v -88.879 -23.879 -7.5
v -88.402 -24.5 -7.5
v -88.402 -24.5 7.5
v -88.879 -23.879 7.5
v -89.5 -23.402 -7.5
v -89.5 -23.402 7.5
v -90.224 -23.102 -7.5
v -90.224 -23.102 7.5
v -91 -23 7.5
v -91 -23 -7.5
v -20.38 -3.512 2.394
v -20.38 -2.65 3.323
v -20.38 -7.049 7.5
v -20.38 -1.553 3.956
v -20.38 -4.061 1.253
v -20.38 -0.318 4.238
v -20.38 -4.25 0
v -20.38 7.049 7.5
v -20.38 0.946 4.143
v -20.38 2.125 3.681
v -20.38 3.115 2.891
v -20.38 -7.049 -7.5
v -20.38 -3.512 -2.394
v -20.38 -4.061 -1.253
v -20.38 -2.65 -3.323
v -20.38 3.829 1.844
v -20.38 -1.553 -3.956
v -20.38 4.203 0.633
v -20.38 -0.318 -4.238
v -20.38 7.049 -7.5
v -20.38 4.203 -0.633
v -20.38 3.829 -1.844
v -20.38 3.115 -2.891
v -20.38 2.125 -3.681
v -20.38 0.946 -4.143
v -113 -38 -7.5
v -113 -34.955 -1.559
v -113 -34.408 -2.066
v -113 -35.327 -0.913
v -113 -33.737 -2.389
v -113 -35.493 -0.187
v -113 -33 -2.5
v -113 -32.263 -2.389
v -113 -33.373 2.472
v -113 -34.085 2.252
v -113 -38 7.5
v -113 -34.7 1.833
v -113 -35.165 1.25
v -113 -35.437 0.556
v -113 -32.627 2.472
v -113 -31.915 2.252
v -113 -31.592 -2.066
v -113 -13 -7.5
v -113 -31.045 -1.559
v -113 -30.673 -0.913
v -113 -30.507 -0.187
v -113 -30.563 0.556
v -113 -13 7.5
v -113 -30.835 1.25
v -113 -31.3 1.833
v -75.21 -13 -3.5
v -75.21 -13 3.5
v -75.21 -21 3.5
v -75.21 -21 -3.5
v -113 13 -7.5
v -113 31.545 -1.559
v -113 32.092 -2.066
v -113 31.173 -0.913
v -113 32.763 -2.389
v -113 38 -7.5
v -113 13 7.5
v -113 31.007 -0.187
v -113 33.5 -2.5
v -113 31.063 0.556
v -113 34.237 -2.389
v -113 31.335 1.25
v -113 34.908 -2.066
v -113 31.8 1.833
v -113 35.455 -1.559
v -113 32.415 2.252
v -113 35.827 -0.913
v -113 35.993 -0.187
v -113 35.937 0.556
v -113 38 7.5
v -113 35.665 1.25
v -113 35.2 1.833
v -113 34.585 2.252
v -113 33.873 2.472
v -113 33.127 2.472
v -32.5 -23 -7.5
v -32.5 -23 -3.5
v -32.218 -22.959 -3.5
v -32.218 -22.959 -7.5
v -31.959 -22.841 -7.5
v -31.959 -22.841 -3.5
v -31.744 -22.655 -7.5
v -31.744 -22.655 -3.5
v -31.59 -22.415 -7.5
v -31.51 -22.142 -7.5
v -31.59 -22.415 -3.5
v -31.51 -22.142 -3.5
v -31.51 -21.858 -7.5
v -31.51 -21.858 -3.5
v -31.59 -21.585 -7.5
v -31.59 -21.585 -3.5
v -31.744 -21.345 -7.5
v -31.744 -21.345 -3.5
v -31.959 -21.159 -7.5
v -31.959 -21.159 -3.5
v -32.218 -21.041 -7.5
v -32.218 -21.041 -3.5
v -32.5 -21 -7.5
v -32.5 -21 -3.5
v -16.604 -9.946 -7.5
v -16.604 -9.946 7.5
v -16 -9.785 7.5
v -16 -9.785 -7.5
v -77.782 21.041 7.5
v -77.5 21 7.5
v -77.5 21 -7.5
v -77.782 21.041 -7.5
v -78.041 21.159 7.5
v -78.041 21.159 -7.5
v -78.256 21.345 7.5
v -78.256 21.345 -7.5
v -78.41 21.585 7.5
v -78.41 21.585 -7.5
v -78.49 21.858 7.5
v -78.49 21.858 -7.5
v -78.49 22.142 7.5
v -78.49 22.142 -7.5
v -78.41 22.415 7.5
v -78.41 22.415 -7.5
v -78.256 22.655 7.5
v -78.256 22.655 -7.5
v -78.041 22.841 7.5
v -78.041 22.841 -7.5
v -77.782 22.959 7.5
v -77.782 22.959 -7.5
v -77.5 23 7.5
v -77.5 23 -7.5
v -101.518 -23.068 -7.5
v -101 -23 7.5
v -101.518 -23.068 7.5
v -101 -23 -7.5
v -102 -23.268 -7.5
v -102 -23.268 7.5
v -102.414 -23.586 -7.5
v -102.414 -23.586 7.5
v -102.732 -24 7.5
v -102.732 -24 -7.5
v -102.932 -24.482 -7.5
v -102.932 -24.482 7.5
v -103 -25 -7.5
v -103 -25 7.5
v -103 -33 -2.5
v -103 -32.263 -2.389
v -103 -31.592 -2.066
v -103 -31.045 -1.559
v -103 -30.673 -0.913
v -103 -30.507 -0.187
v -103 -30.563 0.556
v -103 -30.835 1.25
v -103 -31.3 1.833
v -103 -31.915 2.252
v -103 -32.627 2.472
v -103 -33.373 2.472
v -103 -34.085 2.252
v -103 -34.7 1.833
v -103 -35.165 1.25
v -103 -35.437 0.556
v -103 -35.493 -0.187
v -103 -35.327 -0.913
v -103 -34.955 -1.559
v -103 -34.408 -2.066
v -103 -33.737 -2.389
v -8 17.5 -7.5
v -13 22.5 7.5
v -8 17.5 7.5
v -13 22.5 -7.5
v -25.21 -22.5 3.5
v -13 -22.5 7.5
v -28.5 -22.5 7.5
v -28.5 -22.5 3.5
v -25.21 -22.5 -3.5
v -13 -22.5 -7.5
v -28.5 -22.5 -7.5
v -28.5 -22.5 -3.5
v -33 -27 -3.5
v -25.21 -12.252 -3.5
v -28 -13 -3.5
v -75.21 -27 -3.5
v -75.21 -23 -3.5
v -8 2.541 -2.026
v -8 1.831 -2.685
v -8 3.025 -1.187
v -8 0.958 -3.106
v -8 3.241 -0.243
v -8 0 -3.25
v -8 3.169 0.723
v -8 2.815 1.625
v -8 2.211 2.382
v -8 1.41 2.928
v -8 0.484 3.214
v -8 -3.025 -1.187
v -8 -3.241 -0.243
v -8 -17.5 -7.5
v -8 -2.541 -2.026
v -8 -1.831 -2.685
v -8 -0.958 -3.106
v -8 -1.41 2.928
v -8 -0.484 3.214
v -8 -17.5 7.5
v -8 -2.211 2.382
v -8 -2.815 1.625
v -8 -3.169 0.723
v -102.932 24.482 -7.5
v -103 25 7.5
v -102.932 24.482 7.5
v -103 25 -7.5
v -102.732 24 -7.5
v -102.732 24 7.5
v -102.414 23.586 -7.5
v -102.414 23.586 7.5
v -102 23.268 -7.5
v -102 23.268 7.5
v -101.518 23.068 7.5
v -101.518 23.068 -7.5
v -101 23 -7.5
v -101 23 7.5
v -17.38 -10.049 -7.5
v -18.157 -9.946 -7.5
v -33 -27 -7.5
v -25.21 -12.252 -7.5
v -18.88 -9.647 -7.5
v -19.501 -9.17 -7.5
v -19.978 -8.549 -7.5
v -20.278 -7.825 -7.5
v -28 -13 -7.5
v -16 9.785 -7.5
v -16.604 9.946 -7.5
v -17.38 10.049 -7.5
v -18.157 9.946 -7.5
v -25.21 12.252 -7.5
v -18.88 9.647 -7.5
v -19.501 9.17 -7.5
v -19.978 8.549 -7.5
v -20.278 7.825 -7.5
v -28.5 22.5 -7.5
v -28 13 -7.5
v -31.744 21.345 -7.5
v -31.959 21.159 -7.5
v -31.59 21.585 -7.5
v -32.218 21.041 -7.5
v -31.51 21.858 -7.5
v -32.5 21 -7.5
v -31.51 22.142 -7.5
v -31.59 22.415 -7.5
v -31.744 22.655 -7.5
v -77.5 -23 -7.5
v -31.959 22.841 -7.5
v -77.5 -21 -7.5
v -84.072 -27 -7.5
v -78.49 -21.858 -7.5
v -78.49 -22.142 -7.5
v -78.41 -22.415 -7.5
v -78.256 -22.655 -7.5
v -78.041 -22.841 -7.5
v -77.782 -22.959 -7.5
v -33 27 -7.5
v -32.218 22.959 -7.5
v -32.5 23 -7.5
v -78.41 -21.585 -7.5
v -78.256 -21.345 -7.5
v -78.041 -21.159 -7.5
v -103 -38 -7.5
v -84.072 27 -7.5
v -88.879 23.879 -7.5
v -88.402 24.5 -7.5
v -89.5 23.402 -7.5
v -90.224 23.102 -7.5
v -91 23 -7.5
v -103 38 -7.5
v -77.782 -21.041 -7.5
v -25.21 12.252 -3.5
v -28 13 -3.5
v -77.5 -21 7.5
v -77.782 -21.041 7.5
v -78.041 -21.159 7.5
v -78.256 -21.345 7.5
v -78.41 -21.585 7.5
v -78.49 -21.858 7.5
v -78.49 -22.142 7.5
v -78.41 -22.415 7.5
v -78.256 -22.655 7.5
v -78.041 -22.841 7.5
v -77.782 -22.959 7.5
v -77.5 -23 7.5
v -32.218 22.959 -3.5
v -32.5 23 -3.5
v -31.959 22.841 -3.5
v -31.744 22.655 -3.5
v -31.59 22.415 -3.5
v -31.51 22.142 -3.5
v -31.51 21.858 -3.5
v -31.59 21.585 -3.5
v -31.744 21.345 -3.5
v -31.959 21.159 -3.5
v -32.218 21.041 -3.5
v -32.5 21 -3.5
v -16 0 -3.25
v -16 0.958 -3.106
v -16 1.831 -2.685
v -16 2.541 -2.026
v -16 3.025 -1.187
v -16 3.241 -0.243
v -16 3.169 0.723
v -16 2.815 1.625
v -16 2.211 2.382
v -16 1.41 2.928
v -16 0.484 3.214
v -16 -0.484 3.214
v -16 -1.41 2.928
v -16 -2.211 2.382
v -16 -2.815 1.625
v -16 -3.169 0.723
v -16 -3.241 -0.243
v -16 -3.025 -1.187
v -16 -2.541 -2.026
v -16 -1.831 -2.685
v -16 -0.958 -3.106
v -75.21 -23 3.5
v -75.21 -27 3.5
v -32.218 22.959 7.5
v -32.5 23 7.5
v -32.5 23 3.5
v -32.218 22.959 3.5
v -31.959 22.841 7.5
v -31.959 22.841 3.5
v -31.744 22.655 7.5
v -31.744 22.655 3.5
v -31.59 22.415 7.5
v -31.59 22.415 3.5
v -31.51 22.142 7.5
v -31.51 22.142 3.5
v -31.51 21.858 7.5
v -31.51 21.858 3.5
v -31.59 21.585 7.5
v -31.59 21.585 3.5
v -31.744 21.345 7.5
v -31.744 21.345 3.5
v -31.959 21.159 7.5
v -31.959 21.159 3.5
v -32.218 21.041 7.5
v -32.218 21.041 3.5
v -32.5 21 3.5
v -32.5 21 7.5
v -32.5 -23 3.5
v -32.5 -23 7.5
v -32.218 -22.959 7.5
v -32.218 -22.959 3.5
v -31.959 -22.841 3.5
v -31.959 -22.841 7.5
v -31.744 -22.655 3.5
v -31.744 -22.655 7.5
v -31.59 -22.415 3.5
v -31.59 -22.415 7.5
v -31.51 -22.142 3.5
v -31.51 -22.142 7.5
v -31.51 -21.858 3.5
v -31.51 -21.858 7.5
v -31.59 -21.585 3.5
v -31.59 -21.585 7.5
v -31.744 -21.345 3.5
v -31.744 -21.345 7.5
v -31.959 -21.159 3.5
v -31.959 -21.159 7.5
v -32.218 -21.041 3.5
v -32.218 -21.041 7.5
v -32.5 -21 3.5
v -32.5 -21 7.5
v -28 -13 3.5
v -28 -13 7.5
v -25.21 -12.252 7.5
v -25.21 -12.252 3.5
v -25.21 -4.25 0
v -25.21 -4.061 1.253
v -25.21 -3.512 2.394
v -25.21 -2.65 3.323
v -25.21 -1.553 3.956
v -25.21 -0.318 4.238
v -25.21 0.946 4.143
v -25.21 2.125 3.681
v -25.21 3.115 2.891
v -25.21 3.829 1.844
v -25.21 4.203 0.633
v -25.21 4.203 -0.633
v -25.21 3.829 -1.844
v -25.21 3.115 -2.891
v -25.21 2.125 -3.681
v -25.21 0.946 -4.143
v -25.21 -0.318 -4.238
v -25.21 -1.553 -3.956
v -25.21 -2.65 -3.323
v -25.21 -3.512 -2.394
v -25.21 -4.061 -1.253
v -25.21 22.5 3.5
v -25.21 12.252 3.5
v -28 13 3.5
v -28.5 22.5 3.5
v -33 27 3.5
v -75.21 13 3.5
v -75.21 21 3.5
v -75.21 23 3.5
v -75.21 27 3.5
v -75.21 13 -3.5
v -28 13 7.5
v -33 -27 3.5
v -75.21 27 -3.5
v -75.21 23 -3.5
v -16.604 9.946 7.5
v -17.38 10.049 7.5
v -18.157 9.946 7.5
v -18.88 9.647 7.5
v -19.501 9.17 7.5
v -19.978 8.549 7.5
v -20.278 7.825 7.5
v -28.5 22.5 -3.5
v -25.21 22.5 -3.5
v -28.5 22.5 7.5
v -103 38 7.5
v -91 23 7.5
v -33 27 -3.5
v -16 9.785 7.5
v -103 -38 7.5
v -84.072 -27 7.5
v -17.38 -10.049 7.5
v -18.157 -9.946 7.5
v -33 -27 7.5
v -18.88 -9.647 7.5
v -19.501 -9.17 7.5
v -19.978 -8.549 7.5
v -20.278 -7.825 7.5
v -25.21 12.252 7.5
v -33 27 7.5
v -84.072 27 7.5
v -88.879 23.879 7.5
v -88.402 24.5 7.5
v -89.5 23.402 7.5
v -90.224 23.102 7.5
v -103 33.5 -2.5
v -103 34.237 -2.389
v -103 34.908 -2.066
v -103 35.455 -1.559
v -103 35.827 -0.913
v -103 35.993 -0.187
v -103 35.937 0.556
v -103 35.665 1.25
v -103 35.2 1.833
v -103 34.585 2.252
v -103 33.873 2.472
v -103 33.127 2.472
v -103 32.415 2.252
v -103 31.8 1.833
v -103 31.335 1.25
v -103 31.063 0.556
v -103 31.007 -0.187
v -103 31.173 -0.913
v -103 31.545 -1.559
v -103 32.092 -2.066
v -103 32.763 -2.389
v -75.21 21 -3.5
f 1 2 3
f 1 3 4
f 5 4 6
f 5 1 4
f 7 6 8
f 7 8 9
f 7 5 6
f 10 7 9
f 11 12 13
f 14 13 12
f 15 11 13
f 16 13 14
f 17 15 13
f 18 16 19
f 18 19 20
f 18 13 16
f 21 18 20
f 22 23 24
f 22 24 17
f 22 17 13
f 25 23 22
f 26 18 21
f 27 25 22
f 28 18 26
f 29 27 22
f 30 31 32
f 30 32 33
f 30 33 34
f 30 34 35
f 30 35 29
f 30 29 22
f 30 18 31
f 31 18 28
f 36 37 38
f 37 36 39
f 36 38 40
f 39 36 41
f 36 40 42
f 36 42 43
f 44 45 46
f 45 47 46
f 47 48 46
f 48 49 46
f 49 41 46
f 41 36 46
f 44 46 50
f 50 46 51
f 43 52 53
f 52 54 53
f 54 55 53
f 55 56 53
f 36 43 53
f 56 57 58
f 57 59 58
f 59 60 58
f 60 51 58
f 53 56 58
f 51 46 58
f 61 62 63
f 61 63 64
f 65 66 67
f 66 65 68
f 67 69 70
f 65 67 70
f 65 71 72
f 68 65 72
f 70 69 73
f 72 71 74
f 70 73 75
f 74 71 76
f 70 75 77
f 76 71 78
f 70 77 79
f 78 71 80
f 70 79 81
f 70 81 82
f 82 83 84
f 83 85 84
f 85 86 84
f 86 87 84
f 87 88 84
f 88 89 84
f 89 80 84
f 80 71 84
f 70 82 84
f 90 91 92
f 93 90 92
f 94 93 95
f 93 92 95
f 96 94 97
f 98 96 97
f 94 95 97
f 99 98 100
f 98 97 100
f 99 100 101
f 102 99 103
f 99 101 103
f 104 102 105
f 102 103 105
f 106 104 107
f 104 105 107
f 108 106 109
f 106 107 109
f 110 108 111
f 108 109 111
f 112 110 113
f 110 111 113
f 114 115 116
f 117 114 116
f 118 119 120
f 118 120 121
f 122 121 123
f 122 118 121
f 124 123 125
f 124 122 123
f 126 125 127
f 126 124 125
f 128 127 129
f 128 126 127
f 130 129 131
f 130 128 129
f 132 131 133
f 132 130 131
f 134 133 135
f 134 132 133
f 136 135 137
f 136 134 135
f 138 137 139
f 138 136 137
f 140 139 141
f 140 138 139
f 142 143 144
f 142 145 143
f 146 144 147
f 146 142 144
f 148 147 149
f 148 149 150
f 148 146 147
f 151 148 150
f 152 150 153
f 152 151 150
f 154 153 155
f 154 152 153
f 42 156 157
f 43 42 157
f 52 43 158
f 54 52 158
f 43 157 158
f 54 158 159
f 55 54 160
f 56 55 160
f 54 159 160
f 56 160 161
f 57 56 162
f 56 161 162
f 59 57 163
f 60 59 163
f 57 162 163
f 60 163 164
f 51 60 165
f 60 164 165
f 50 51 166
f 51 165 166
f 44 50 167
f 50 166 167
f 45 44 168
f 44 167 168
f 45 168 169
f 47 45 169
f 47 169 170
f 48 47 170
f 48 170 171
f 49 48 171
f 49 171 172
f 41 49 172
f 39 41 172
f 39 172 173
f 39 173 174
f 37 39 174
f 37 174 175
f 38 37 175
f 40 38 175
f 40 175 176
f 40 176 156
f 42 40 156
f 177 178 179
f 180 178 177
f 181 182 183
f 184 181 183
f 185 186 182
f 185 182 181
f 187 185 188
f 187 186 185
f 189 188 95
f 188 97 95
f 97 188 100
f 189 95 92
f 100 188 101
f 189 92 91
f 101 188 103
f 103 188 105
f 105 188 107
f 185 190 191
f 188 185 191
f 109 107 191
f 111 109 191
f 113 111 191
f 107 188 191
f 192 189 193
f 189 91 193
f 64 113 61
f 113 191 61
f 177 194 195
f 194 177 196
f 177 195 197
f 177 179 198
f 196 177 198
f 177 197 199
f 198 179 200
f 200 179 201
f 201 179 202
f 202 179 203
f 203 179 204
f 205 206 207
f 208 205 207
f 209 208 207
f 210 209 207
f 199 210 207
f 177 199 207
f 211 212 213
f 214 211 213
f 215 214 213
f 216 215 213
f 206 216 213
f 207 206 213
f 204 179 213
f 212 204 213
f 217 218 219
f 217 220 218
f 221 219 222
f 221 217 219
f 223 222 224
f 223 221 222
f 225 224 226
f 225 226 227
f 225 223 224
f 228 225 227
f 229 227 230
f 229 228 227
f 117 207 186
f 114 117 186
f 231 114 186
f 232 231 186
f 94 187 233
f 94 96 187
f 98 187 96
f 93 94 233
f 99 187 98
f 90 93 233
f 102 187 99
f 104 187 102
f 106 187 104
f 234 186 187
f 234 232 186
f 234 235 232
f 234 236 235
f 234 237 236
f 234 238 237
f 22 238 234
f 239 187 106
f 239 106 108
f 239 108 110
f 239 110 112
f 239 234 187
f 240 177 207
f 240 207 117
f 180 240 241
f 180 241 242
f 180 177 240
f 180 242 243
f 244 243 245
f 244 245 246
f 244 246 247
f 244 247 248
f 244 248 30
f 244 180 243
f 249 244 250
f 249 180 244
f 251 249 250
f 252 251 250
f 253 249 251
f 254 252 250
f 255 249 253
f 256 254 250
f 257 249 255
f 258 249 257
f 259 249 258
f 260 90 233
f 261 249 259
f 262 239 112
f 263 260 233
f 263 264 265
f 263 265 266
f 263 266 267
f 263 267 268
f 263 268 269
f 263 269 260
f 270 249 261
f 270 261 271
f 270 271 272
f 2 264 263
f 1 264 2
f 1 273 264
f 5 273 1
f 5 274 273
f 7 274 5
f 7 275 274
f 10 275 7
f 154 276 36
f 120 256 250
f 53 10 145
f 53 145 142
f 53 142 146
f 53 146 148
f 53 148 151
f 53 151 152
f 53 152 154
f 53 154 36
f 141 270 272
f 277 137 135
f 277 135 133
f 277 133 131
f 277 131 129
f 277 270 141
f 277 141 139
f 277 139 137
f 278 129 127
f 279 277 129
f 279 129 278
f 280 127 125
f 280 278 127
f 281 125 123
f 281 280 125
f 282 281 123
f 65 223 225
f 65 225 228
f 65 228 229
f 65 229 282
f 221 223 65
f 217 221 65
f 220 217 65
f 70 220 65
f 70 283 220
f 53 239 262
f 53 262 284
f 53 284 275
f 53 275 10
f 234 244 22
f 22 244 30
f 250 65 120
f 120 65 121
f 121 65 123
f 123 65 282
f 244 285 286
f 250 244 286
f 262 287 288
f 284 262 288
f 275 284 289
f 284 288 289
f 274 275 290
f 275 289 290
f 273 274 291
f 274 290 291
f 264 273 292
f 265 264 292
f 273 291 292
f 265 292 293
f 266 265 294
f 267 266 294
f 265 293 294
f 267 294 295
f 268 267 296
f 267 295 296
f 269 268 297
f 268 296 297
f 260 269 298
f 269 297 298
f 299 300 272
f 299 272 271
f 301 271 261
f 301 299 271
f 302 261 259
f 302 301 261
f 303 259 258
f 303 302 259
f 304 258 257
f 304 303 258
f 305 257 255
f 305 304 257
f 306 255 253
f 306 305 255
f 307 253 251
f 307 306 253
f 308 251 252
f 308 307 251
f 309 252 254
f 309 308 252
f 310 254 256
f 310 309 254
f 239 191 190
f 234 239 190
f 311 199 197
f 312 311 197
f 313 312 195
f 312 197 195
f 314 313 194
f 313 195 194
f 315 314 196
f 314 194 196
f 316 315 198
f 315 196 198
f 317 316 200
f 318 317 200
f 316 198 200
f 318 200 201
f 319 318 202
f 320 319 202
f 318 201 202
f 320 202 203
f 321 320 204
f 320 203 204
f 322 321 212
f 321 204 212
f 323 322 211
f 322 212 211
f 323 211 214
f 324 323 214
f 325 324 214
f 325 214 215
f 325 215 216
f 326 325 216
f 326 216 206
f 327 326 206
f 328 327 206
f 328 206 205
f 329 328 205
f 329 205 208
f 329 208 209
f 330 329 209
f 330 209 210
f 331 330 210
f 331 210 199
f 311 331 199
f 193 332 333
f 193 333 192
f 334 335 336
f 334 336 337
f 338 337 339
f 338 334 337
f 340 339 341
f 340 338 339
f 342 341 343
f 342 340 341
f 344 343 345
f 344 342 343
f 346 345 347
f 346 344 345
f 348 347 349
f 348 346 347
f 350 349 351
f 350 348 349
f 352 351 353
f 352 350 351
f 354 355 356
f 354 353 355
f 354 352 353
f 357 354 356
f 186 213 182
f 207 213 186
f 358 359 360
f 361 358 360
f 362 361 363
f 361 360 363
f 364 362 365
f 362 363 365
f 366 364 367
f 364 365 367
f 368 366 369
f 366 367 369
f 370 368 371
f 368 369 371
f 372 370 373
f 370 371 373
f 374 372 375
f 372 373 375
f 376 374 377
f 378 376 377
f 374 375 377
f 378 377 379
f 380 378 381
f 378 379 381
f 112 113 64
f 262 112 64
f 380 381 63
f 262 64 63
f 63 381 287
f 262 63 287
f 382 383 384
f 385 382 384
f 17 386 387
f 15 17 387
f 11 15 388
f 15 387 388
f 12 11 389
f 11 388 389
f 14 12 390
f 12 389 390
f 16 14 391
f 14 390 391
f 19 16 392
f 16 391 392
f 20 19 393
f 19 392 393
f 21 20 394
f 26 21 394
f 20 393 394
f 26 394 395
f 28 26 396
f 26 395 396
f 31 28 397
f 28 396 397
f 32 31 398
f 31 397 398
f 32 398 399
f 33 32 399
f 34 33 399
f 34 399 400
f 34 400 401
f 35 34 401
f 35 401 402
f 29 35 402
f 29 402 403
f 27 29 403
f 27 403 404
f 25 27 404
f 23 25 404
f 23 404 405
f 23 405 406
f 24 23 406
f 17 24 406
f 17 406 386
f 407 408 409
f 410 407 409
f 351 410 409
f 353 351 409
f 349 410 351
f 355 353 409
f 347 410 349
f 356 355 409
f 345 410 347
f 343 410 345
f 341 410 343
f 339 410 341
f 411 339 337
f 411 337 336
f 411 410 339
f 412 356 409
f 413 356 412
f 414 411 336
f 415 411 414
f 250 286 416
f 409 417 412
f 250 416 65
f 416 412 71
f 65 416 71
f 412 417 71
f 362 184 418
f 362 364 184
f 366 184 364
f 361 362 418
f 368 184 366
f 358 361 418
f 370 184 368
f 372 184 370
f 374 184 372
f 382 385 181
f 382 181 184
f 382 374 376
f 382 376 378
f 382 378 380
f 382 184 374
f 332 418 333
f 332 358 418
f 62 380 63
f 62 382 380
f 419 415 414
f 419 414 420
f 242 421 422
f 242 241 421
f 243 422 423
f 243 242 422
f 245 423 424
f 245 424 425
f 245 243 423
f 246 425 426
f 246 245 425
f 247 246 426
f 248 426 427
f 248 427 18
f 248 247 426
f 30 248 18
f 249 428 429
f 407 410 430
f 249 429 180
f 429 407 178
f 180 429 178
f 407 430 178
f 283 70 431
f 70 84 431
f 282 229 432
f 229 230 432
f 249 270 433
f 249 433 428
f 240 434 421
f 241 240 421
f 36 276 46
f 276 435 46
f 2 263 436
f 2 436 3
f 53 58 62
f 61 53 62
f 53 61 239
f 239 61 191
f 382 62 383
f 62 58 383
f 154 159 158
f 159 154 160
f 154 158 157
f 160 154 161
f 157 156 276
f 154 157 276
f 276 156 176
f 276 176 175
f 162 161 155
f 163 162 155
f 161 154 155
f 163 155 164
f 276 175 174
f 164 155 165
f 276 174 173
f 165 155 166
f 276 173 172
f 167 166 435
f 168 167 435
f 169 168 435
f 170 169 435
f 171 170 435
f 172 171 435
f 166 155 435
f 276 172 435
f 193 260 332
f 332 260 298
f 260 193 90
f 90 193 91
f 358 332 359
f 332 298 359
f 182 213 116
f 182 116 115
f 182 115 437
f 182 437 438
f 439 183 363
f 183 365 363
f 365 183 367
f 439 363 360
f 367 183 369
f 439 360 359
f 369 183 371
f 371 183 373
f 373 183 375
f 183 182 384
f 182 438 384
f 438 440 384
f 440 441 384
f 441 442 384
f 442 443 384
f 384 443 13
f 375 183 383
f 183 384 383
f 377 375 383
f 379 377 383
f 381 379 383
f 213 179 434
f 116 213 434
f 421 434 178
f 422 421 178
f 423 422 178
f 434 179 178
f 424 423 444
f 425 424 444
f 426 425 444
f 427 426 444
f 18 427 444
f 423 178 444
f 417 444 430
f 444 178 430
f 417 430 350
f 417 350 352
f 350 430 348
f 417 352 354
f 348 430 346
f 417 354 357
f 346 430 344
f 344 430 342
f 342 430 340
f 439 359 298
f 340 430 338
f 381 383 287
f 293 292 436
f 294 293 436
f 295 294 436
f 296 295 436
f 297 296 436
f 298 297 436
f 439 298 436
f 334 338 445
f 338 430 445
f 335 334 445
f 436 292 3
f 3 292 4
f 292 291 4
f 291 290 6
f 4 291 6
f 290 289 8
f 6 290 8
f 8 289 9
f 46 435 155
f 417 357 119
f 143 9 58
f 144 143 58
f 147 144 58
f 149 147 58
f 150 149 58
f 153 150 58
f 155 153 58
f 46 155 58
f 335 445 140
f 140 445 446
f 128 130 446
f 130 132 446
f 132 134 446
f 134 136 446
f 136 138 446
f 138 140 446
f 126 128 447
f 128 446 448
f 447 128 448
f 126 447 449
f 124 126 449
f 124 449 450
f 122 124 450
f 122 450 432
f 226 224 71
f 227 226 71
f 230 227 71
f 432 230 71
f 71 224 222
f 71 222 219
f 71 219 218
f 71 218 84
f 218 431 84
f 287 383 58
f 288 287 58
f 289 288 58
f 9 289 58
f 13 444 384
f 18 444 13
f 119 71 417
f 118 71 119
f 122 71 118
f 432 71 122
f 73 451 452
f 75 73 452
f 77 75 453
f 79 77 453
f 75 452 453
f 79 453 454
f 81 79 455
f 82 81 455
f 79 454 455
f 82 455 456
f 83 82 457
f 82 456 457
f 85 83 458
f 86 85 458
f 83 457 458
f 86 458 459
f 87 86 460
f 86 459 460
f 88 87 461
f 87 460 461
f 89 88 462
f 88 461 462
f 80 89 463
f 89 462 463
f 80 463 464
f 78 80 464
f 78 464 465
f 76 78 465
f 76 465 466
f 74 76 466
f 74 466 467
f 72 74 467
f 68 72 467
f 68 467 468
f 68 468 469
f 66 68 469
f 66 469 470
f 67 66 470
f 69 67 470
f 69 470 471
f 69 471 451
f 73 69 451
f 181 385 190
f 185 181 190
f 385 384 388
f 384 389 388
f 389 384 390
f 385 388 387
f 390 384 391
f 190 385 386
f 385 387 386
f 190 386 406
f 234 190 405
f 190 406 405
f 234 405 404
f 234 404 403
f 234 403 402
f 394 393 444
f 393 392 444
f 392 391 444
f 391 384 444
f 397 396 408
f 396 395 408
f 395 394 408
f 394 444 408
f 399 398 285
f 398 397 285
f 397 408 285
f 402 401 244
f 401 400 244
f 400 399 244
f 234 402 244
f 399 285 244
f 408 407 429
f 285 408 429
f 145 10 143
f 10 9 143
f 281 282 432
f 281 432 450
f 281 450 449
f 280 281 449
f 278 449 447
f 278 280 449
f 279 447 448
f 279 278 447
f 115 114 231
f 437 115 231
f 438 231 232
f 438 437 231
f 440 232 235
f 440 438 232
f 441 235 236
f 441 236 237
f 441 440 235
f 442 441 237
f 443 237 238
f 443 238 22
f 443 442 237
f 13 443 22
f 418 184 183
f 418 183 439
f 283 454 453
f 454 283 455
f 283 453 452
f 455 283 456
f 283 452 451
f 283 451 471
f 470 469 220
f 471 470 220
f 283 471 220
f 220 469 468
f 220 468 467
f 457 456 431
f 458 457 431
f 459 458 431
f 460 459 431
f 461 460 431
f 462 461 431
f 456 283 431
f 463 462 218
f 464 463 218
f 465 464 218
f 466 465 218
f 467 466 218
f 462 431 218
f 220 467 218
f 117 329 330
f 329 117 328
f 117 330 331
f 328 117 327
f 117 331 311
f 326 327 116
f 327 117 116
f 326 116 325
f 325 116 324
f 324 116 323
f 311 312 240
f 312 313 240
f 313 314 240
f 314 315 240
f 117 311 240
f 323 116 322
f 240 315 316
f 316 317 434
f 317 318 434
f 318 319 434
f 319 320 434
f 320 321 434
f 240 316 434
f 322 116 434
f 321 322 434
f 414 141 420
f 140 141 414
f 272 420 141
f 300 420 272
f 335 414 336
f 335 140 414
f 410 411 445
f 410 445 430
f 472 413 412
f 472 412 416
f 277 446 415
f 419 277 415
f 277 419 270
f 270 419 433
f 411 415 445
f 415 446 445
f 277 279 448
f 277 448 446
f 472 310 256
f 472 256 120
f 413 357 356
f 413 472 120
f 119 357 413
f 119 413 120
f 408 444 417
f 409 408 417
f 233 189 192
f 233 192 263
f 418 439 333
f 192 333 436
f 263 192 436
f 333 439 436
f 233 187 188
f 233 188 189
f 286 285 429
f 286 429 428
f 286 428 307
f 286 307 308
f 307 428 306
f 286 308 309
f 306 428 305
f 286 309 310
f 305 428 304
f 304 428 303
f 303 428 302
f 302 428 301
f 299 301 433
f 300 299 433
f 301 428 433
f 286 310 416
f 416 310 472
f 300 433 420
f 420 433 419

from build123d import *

# Parameters (mm, degrees)
BOSS_EXTRUDE1_DEPTH     = 7.5
SKETCH2_R               = 3.25
CUT_EXTRUDE1_DEPTH      = 112.91626334
FILLET1_R               = 2
SKETCH3_R               = 2.5
CUT_EXTRUDE2_DEPTH      = 103.592641062
CUT_EXTRUDE4_DEPTH      = 121.158229015
BOSS_EXTRUDE2_REACH     = 128.857
SKETCH7_W               = 5
SKETCH7_H               = 15
FILLET2_R               = 3
SKETCH8_R               = 4.25
CUT_EXTRUDE6_DEPTH      = 4.829629131
CUT_EXTRUDE3_DEPTH      = 125.202455692
CUT_EXTRUDE3_DEPTH_BACK = 125.202455692
SKETCH4_W               = 50
SKETCH4_H               = 7
CHAMFER1_START          = -7.5
CHAMFER1_DEPTH          = 15
CHAMFER2_SIZE           = 5


with BuildPart() as part:
    # Sketch1 → Boss-Extrude1 (new, symmetric)
    with BuildSketch(Plane.XY):
        Polygon((-28, 13), (-113, 13), (-113, 38), (-103, 38), (-103, 23), (-88, 23), (-88, 27), (-28, 27), (-28, 22.5), (-8, 22.5), (-8, -22.5), (-28, -22.5), (-28, -27), (-88, -27), (-88, -23), (-103, -23), (-103, -38), (-113, -38), (-113, -13), (-28, -13), (-16, -9.784609691), (-16, 9.784609691), align=None)
    extrude(amount=BOSS_EXTRUDE1_DEPTH, both=True)

    # Sketch2 → Cut-Extrude1 (cut, through all)
    with BuildSketch(Plane(origin=(-8, 0, 0), x_dir=(0, 0, -1), z_dir=(1, 0, 0))):
        Circle(SKETCH2_R)
    extrude(amount=-CUT_EXTRUDE1_DEPTH, mode=Mode.SUBTRACT)

    # Fillet1
    fillet1_edges = [part.edges().sort_by_distance(p)[0] for p in [
        (-103, -23, 0),
        (-103, 23, 0),
    ]]
    fillet(fillet1_edges, radius=FILLET1_R)

    # Sketch3 → Cut-Extrude2 (cut, through all)
    with BuildSketch(Plane(origin=(-103, 0, 0), x_dir=(0, 0, -1), z_dir=(1, 0, 0))):
        with Locations((0, 33.5)):
            Circle(SKETCH3_R)
        with Locations((0, -33)):
            Circle(SKETCH3_R)
    extrude(amount=-CUT_EXTRUDE2_DEPTH, mode=Mode.SUBTRACT)

    # Sketch5 → Cut-Extrude4 (cut, through all)
    with BuildSketch(Plane.XY.offset(7.5)):
        with BuildLine():
            Line((-77.5, 23.000000001), (-32.5, 23.000000001))
            ThreePointArc((-32.5, 23.000000001), (-31.5, 22.000000001), (-32.5, 21.000000001))
            Line((-32.5, 21.000000001), (-77.5, 21.000000001))
            ThreePointArc((-77.5, 21.000000001), (-78.5, 22.000000001), (-77.5, 23.000000001))
        make_face()
        with BuildLine():
            Line((-77.5, -23.000000001), (-32.5, -23.000000001))
            ThreePointArc((-32.5, -23.000000001), (-31.5, -22.000000001), (-32.5, -21.000000001))
            Line((-32.5, -21.000000001), (-77.5, -21.000000001))
            ThreePointArc((-77.5, -21.000000001), (-78.5, -22.000000001), (-77.5, -23.000000001))
        make_face()
    extrude(amount=-CUT_EXTRUDE4_DEPTH, mode=Mode.SUBTRACT)

    # Boss-Extrude2: up to this plane
    boss_extrude2_end = Plane(origin=(-16, -9.784609691, -7.5), z_dir=(-0.25881904510251796, 0.9659258262890691, 0))
    # Sketch7 → Boss-Extrude2 (add, up to the surface)
    with BuildSketch(Plane(origin=(1.374355653, 5.129165125, 0), x_dir=(-0.9659258262890691, 0.25881904510251813, 0), z_dir=(-0.25881904510251813, -0.9659258262890691, 0)), mode=Mode.PRIVATE) as boss_extrude2_sk1:
        with Locations((25.021910533, 0)):
            Rectangle(SKETCH7_W, SKETCH7_H)
    boss_extrude2_tool1 = split(extrude(boss_extrude2_sk1.sketch, amount=BOSS_EXTRUDE2_REACH, dir=(0, -1, 0), mode=Mode.PRIVATE), bisect_by=boss_extrude2_end, keep=Keep.BOTH, mode=Mode.PRIVATE)
    add(boss_extrude2_tool1.solids().sort_by_distance((-22.794954, 11.605312, 0))[0])

    # Fillet2
    fillet2_edges = [part.edges().sort_by_distance(p)[0] for p in [
        (-20.380139389, -10.958264503, 0),
        (-20.380139389, 10.958264503, 0),
        (-88, -23, 0),
        (-88, 23, 0),
    ]]
    fillet(fillet2_edges, radius=FILLET2_R)

    # Sketch8 → Cut-Extrude6 (cut)
    with BuildSketch(Plane.ZY.offset(25.20976852)):
        with Locations(Location((0, 0, 0), (0, 0, 270))):
            Circle(SKETCH8_R)
    extrude(amount=-CUT_EXTRUDE6_DEPTH, mode=Mode.SUBTRACT)

    # Sketch4 → Cut-Extrude3 (cut, two sides: drawn at the far end of the back side and taken through both)
    with BuildSketch(Plane(origin=(0, 13, 0), x_dir=(-1, 0, 0), z_dir=(0, -1, 0)).offset(-CUT_EXTRUDE3_DEPTH_BACK)):
        with Locations((50.20976852, 0)):
            Rectangle(SKETCH4_W, SKETCH4_H)
    extrude(amount=CUT_EXTRUDE3_DEPTH + CUT_EXTRUDE3_DEPTH_BACK, mode=Mode.SUBTRACT)

    # Chamfer1: read off the stored shape, not the designer's step
    # Chamfer1 outline → Chamfer1 (cut)
    with BuildSketch(Plane.XY.offset(CHAMFER1_START)):
        Polygon((-28, 27), (-33, 27), (-28.5, 22.5), (-28, 22.5), align=None)
        with BuildLine():
            Line((-88.401923788, 24.5), (-84.07179677, 27))
            Line((-84.07179677, 27), (-88, 27))
            Line((-88, 27), (-88, 26))
            ThreePointArc((-88, 26), (-88.102222521, 25.223542864), (-88.401923788, 24.5))
        make_face()
        Polygon((-28.5, -22.5), (-33, -27), (-28, -27), (-28, -22.5), align=None)
        with BuildLine():
            Line((-84.07179677, -27), (-88.401923788, -24.5))
            ThreePointArc((-88.401923788, -24.5), (-88.102222521, -25.223542864), (-88, -26))
            Line((-88, -26), (-88, -27))
            Line((-88, -27), (-84.07179677, -27))
        make_face()
    extrude(amount=CHAMFER1_DEPTH, mode=Mode.SUBTRACT)

    # Chamfer2
    chamfer2_edges = [part.edges().sort_by_distance(p)[0] for p in [
        (-8, 22.5, 0),
        (-8, -22.5, 0),
    ]]
    chamfer(chamfer2_edges, length=CHAMFER2_SIZE)


solid = part.part
